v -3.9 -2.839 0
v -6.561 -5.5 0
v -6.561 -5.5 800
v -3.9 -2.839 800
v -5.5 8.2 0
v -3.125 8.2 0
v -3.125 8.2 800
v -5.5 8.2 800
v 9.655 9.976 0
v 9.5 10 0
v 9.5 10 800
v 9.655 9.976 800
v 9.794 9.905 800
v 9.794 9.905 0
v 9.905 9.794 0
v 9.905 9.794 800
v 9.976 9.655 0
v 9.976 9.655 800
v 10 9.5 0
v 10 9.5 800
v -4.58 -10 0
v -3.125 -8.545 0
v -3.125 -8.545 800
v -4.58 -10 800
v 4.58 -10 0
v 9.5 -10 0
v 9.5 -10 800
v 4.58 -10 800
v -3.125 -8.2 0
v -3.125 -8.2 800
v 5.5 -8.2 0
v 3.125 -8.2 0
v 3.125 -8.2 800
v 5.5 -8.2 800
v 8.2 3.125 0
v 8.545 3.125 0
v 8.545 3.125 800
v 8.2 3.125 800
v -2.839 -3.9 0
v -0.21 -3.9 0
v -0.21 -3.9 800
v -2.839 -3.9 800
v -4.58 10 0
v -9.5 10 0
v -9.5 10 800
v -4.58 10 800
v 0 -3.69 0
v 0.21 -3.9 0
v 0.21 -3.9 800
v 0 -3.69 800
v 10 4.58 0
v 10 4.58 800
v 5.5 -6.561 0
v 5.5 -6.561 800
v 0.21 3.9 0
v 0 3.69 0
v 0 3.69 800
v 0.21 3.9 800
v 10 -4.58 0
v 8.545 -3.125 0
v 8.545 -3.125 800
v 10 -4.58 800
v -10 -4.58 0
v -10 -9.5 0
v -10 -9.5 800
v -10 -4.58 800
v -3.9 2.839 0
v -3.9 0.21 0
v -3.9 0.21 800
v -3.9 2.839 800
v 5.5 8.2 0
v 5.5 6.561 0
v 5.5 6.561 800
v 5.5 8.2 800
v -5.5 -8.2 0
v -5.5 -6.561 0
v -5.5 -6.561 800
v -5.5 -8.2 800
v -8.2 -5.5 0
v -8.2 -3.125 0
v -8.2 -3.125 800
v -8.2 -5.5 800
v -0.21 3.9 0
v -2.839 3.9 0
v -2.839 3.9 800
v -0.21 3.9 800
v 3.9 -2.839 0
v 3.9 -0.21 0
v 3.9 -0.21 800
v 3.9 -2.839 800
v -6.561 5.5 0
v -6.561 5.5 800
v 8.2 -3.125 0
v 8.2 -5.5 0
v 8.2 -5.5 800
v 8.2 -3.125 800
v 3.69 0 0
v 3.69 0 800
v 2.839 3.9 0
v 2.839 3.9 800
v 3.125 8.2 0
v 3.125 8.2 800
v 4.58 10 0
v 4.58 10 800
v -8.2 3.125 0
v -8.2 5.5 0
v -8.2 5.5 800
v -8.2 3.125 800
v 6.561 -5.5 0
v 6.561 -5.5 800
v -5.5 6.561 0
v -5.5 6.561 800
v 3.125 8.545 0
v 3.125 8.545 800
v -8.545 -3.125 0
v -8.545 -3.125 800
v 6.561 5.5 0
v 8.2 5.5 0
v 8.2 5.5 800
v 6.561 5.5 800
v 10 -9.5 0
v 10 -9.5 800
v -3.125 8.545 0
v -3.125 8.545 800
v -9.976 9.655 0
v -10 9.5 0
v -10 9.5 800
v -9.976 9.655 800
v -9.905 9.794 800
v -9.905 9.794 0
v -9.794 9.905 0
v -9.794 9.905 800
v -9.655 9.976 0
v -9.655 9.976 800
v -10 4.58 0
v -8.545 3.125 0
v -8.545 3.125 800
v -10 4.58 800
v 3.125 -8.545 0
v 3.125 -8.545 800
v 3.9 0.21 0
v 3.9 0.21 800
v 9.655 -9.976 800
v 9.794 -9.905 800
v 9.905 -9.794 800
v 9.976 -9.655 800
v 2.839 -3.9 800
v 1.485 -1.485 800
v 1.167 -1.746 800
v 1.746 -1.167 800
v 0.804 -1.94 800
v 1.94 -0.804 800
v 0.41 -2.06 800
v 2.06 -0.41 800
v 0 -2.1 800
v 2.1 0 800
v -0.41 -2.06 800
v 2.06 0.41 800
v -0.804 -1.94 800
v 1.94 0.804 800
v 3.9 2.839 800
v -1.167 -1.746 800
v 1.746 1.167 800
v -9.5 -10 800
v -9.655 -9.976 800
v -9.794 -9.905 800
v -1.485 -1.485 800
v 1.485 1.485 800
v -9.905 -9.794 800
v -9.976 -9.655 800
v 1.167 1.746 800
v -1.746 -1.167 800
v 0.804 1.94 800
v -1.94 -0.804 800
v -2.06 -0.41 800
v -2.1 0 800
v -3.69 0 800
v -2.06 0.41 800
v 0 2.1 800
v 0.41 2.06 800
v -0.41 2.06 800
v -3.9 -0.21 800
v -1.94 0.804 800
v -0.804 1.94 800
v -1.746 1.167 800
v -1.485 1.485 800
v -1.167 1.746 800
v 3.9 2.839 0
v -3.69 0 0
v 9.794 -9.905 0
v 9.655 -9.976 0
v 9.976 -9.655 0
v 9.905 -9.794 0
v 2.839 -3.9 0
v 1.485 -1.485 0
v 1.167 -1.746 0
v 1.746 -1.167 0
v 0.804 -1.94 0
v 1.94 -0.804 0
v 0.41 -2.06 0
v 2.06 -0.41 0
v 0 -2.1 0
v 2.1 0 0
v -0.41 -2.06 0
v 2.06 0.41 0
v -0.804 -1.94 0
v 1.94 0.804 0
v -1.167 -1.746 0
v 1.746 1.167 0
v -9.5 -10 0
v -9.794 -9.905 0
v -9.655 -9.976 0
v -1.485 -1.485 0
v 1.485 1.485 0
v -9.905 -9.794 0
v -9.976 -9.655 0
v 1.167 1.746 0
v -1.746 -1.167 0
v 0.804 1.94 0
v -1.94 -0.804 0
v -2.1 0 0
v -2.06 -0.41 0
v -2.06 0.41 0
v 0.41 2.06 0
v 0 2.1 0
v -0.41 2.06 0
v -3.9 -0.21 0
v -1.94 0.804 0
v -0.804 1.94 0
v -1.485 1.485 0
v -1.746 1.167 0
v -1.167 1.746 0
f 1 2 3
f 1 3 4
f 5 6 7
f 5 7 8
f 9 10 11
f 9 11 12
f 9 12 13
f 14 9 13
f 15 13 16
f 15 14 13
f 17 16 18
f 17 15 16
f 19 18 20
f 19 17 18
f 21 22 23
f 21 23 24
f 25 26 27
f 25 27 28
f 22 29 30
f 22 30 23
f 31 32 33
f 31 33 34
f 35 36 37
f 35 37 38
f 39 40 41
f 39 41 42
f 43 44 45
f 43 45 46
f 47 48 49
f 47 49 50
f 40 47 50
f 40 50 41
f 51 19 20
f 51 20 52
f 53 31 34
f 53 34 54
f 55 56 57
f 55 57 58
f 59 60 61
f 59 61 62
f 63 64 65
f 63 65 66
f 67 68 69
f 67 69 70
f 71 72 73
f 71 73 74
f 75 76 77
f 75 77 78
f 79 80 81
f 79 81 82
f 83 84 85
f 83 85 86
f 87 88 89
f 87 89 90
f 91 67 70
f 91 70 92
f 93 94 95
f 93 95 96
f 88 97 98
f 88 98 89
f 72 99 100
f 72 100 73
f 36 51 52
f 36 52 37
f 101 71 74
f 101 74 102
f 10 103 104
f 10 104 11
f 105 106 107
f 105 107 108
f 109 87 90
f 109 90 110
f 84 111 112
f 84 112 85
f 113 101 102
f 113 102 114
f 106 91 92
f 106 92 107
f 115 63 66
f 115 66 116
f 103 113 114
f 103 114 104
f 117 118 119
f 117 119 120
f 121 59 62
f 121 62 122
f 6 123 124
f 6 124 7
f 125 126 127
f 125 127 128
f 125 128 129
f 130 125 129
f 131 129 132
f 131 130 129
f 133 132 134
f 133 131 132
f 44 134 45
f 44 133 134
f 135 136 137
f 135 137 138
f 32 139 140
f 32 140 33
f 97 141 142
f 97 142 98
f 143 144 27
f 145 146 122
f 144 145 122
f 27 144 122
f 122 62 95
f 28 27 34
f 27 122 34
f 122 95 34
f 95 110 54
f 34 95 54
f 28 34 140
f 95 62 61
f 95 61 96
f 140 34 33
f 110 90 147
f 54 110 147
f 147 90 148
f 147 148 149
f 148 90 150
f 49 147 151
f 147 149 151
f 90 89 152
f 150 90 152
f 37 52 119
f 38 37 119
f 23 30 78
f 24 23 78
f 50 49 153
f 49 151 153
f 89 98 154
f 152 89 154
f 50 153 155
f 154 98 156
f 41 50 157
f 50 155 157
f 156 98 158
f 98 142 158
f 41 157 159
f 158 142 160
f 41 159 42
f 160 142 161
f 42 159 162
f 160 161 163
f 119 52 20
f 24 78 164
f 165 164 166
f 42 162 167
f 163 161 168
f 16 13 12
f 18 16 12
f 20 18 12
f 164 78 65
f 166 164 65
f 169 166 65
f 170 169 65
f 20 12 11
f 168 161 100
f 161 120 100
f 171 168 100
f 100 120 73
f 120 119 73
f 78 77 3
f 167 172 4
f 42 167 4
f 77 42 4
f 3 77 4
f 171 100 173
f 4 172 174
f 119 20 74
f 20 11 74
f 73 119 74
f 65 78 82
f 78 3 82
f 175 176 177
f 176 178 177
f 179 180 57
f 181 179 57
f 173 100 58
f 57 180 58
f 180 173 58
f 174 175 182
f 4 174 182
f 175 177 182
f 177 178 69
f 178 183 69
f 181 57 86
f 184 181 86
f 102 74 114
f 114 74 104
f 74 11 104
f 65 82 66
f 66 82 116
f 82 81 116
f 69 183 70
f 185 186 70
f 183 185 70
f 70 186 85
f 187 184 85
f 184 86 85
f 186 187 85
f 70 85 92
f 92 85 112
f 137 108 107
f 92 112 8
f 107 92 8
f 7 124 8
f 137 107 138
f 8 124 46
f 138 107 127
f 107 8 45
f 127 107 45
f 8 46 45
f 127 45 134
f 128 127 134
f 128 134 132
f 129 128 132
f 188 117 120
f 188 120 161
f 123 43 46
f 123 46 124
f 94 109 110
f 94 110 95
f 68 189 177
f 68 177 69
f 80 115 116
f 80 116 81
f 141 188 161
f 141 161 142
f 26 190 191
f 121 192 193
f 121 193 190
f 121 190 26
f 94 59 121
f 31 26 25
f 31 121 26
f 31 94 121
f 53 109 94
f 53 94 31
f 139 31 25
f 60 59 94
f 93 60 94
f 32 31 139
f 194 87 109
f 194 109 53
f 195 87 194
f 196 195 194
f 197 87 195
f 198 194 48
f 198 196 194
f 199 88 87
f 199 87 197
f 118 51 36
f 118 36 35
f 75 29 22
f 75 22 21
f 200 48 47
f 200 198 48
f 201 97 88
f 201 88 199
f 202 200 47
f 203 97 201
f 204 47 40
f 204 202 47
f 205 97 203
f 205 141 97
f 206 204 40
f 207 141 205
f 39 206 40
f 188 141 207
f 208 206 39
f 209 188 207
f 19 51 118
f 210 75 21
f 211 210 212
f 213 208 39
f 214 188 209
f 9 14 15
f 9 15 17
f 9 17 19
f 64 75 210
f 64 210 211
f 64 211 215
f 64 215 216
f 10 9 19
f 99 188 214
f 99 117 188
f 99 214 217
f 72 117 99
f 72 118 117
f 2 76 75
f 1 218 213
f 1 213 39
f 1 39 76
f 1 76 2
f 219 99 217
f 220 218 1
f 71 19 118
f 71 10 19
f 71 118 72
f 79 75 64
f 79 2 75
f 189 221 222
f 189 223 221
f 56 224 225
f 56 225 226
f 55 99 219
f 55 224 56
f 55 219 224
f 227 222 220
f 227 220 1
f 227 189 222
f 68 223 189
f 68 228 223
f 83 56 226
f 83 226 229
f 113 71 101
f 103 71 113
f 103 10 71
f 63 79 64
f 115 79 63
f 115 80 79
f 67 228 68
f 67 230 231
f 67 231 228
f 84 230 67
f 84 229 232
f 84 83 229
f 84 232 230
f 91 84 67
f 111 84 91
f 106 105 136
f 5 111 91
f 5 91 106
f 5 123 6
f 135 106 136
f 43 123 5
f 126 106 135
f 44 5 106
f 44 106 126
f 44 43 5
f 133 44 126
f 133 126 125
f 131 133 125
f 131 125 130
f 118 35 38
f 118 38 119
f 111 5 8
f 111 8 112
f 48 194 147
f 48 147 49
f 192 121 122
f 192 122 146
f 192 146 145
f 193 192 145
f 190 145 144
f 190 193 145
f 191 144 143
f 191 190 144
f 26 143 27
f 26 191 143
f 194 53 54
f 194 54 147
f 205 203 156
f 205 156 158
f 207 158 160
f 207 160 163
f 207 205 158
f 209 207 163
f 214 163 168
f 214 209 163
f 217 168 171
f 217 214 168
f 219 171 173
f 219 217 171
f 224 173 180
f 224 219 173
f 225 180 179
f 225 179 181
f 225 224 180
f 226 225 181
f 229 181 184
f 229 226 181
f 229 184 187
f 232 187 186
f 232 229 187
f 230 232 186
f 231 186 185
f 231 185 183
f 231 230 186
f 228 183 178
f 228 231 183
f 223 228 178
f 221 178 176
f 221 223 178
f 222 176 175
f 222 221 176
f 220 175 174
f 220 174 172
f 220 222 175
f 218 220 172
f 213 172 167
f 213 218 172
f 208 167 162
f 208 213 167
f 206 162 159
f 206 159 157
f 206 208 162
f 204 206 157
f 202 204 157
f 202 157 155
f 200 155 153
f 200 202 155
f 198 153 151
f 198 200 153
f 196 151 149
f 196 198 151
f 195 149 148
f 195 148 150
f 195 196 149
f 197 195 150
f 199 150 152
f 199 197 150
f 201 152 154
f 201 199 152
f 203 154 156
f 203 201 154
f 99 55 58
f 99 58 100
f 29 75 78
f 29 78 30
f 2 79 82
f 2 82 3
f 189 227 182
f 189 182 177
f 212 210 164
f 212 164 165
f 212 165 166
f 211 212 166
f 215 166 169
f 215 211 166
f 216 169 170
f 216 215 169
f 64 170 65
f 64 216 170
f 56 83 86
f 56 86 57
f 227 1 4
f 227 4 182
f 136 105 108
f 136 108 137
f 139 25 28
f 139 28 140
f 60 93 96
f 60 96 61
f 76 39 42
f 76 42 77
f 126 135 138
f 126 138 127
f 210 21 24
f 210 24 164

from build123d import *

# Parameters (mm, degrees)
SKETCH1_R           = 2.1
BOSS_EXTRUDE1_DEPTH = 800


with BuildPart() as part:
    # Sketch1 → Boss-Extrude1 (new body)
    with BuildSketch(Plane.XY):
        with BuildLine():
            Line((3.69, 0), (3.9, -0.21))
            Line((3.9, -0.21), (3.9, -2.839339828))
            Line((3.9, -2.839339828), (6.560660172, -5.5))
            Line((6.560660172, -5.5), (8.2, -5.5))
            Line((8.2, -5.5), (8.2, -3.125))
            Line((8.2, -3.125), (8.545, -3.125))
            Line((8.545, -3.125), (10, -4.58))
            Line((10, -4.58), (10, -9.5))
            ThreePointArc((10, -9.5), (9.853553391, -9.853553391), (9.5, -10))
            Line((9.5, -10), (4.58, -10))
            Line((4.58, -10), (3.125, -8.545))
            Line((3.125, -8.545), (3.125, -8.2))
            Line((3.125, -8.2), (5.5, -8.2))
            Line((5.5, -8.2), (5.5, -6.560660172))
            Line((5.5, -6.560660172), (2.839339828, -3.9))
            Line((2.839339828, -3.9), (0.21, -3.9))
            Line((0.21, -3.9), (0, -3.69))
            Line((0, -3.69), (-0.21, -3.9))
            Line((-0.21, -3.9), (-2.839339828, -3.9))
            Line((-2.839339828, -3.9), (-5.5, -6.560660172))
            Line((-5.5, -6.560660172), (-5.5, -8.2))
            Line((-5.5, -8.2), (-3.125, -8.2))
            Line((-3.125, -8.2), (-3.125, -8.545))
            Line((-3.125, -8.545), (-4.58, -10))
            Line((-4.58, -10), (-9.5, -10))
            ThreePointArc((-9.5, -10), (-9.853553391, -9.853553391), (-10, -9.5))
            Line((-10, -9.5), (-10, -4.58))
            Line((-10, -4.58), (-8.545, -3.125))
            Line((-8.545, -3.125), (-8.2, -3.125))
            Line((-8.2, -3.125), (-8.2, -5.5))
            Line((-8.2, -5.5), (-6.560660172, -5.5))
            Line((-6.560660172, -5.5), (-3.9, -2.839339828))
            Line((-3.9, -2.839339828), (-3.9, -0.21))
            Line((-3.9, -0.21), (-3.69, 0))
            Line((-3.69, 0), (-3.9, 0.21))
            Line((-3.9, 0.21), (-3.9, 2.839339828))
            Line((-3.9, 2.839339828), (-6.560660172, 5.5))
            Line((-6.560660172, 5.5), (-8.2, 5.5))
            Line((-8.2, 5.5), (-8.2, 3.125))
            Line((-8.2, 3.125), (-8.545, 3.125))
            Line((-8.545, 3.125), (-10, 4.58))
            Line((-10, 4.58), (-10, 9.5))
            ThreePointArc((-10, 9.5), (-9.853553391, 9.853553391), (-9.5, 10))
            Line((-9.5, 10), (-4.58, 10))
            Line((-4.58, 10), (-3.125, 8.545))
            Line((-3.125, 8.545), (-3.125, 8.2))
            Line((-3.125, 8.2), (-5.5, 8.2))
            Line((-5.5, 8.2), (-5.5, 6.560660172))
            Line((-5.5, 6.560660172), (-2.839339828, 3.9))
            Line((-2.839339828, 3.9), (-0.21, 3.9))
            Line((-0.21, 3.9), (0, 3.69))
            Line((0, 3.69), (0.21, 3.9))
            Line((0.21, 3.9), (2.839339828, 3.9))
            Line((2.839339828, 3.9), (5.5, 6.560660172))
            Line((5.5, 6.560660172), (5.5, 8.2))
            Line((5.5, 8.2), (3.125, 8.2))
            Line((3.125, 8.2), (3.125, 8.545))
            Line((3.125, 8.545), (4.58, 10))
            Line((4.58, 10), (9.5, 10))
            ThreePointArc((9.5, 10), (9.853553391, 9.853553391), (10, 9.5))
            Line((10, 9.5), (10, 4.58))
            Line((10, 4.58), (8.545, 3.125))
            Line((8.545, 3.125), (8.2, 3.125))
            Line((8.2, 3.125), (8.2, 5.5))
            Line((8.2, 5.5), (6.560660172, 5.5))
            Line((6.560660172, 5.5), (3.9, 2.839339828))
            Line((3.9, 2.839339828), (3.9, 0.21))
            Line((3.9, 0.21), (3.69, 0))
        make_face()
        Circle(SKETCH1_R, mode=Mode.SUBTRACT)
    extrude(amount=BOSS_EXTRUDE1_DEPTH)


solid = part.part
